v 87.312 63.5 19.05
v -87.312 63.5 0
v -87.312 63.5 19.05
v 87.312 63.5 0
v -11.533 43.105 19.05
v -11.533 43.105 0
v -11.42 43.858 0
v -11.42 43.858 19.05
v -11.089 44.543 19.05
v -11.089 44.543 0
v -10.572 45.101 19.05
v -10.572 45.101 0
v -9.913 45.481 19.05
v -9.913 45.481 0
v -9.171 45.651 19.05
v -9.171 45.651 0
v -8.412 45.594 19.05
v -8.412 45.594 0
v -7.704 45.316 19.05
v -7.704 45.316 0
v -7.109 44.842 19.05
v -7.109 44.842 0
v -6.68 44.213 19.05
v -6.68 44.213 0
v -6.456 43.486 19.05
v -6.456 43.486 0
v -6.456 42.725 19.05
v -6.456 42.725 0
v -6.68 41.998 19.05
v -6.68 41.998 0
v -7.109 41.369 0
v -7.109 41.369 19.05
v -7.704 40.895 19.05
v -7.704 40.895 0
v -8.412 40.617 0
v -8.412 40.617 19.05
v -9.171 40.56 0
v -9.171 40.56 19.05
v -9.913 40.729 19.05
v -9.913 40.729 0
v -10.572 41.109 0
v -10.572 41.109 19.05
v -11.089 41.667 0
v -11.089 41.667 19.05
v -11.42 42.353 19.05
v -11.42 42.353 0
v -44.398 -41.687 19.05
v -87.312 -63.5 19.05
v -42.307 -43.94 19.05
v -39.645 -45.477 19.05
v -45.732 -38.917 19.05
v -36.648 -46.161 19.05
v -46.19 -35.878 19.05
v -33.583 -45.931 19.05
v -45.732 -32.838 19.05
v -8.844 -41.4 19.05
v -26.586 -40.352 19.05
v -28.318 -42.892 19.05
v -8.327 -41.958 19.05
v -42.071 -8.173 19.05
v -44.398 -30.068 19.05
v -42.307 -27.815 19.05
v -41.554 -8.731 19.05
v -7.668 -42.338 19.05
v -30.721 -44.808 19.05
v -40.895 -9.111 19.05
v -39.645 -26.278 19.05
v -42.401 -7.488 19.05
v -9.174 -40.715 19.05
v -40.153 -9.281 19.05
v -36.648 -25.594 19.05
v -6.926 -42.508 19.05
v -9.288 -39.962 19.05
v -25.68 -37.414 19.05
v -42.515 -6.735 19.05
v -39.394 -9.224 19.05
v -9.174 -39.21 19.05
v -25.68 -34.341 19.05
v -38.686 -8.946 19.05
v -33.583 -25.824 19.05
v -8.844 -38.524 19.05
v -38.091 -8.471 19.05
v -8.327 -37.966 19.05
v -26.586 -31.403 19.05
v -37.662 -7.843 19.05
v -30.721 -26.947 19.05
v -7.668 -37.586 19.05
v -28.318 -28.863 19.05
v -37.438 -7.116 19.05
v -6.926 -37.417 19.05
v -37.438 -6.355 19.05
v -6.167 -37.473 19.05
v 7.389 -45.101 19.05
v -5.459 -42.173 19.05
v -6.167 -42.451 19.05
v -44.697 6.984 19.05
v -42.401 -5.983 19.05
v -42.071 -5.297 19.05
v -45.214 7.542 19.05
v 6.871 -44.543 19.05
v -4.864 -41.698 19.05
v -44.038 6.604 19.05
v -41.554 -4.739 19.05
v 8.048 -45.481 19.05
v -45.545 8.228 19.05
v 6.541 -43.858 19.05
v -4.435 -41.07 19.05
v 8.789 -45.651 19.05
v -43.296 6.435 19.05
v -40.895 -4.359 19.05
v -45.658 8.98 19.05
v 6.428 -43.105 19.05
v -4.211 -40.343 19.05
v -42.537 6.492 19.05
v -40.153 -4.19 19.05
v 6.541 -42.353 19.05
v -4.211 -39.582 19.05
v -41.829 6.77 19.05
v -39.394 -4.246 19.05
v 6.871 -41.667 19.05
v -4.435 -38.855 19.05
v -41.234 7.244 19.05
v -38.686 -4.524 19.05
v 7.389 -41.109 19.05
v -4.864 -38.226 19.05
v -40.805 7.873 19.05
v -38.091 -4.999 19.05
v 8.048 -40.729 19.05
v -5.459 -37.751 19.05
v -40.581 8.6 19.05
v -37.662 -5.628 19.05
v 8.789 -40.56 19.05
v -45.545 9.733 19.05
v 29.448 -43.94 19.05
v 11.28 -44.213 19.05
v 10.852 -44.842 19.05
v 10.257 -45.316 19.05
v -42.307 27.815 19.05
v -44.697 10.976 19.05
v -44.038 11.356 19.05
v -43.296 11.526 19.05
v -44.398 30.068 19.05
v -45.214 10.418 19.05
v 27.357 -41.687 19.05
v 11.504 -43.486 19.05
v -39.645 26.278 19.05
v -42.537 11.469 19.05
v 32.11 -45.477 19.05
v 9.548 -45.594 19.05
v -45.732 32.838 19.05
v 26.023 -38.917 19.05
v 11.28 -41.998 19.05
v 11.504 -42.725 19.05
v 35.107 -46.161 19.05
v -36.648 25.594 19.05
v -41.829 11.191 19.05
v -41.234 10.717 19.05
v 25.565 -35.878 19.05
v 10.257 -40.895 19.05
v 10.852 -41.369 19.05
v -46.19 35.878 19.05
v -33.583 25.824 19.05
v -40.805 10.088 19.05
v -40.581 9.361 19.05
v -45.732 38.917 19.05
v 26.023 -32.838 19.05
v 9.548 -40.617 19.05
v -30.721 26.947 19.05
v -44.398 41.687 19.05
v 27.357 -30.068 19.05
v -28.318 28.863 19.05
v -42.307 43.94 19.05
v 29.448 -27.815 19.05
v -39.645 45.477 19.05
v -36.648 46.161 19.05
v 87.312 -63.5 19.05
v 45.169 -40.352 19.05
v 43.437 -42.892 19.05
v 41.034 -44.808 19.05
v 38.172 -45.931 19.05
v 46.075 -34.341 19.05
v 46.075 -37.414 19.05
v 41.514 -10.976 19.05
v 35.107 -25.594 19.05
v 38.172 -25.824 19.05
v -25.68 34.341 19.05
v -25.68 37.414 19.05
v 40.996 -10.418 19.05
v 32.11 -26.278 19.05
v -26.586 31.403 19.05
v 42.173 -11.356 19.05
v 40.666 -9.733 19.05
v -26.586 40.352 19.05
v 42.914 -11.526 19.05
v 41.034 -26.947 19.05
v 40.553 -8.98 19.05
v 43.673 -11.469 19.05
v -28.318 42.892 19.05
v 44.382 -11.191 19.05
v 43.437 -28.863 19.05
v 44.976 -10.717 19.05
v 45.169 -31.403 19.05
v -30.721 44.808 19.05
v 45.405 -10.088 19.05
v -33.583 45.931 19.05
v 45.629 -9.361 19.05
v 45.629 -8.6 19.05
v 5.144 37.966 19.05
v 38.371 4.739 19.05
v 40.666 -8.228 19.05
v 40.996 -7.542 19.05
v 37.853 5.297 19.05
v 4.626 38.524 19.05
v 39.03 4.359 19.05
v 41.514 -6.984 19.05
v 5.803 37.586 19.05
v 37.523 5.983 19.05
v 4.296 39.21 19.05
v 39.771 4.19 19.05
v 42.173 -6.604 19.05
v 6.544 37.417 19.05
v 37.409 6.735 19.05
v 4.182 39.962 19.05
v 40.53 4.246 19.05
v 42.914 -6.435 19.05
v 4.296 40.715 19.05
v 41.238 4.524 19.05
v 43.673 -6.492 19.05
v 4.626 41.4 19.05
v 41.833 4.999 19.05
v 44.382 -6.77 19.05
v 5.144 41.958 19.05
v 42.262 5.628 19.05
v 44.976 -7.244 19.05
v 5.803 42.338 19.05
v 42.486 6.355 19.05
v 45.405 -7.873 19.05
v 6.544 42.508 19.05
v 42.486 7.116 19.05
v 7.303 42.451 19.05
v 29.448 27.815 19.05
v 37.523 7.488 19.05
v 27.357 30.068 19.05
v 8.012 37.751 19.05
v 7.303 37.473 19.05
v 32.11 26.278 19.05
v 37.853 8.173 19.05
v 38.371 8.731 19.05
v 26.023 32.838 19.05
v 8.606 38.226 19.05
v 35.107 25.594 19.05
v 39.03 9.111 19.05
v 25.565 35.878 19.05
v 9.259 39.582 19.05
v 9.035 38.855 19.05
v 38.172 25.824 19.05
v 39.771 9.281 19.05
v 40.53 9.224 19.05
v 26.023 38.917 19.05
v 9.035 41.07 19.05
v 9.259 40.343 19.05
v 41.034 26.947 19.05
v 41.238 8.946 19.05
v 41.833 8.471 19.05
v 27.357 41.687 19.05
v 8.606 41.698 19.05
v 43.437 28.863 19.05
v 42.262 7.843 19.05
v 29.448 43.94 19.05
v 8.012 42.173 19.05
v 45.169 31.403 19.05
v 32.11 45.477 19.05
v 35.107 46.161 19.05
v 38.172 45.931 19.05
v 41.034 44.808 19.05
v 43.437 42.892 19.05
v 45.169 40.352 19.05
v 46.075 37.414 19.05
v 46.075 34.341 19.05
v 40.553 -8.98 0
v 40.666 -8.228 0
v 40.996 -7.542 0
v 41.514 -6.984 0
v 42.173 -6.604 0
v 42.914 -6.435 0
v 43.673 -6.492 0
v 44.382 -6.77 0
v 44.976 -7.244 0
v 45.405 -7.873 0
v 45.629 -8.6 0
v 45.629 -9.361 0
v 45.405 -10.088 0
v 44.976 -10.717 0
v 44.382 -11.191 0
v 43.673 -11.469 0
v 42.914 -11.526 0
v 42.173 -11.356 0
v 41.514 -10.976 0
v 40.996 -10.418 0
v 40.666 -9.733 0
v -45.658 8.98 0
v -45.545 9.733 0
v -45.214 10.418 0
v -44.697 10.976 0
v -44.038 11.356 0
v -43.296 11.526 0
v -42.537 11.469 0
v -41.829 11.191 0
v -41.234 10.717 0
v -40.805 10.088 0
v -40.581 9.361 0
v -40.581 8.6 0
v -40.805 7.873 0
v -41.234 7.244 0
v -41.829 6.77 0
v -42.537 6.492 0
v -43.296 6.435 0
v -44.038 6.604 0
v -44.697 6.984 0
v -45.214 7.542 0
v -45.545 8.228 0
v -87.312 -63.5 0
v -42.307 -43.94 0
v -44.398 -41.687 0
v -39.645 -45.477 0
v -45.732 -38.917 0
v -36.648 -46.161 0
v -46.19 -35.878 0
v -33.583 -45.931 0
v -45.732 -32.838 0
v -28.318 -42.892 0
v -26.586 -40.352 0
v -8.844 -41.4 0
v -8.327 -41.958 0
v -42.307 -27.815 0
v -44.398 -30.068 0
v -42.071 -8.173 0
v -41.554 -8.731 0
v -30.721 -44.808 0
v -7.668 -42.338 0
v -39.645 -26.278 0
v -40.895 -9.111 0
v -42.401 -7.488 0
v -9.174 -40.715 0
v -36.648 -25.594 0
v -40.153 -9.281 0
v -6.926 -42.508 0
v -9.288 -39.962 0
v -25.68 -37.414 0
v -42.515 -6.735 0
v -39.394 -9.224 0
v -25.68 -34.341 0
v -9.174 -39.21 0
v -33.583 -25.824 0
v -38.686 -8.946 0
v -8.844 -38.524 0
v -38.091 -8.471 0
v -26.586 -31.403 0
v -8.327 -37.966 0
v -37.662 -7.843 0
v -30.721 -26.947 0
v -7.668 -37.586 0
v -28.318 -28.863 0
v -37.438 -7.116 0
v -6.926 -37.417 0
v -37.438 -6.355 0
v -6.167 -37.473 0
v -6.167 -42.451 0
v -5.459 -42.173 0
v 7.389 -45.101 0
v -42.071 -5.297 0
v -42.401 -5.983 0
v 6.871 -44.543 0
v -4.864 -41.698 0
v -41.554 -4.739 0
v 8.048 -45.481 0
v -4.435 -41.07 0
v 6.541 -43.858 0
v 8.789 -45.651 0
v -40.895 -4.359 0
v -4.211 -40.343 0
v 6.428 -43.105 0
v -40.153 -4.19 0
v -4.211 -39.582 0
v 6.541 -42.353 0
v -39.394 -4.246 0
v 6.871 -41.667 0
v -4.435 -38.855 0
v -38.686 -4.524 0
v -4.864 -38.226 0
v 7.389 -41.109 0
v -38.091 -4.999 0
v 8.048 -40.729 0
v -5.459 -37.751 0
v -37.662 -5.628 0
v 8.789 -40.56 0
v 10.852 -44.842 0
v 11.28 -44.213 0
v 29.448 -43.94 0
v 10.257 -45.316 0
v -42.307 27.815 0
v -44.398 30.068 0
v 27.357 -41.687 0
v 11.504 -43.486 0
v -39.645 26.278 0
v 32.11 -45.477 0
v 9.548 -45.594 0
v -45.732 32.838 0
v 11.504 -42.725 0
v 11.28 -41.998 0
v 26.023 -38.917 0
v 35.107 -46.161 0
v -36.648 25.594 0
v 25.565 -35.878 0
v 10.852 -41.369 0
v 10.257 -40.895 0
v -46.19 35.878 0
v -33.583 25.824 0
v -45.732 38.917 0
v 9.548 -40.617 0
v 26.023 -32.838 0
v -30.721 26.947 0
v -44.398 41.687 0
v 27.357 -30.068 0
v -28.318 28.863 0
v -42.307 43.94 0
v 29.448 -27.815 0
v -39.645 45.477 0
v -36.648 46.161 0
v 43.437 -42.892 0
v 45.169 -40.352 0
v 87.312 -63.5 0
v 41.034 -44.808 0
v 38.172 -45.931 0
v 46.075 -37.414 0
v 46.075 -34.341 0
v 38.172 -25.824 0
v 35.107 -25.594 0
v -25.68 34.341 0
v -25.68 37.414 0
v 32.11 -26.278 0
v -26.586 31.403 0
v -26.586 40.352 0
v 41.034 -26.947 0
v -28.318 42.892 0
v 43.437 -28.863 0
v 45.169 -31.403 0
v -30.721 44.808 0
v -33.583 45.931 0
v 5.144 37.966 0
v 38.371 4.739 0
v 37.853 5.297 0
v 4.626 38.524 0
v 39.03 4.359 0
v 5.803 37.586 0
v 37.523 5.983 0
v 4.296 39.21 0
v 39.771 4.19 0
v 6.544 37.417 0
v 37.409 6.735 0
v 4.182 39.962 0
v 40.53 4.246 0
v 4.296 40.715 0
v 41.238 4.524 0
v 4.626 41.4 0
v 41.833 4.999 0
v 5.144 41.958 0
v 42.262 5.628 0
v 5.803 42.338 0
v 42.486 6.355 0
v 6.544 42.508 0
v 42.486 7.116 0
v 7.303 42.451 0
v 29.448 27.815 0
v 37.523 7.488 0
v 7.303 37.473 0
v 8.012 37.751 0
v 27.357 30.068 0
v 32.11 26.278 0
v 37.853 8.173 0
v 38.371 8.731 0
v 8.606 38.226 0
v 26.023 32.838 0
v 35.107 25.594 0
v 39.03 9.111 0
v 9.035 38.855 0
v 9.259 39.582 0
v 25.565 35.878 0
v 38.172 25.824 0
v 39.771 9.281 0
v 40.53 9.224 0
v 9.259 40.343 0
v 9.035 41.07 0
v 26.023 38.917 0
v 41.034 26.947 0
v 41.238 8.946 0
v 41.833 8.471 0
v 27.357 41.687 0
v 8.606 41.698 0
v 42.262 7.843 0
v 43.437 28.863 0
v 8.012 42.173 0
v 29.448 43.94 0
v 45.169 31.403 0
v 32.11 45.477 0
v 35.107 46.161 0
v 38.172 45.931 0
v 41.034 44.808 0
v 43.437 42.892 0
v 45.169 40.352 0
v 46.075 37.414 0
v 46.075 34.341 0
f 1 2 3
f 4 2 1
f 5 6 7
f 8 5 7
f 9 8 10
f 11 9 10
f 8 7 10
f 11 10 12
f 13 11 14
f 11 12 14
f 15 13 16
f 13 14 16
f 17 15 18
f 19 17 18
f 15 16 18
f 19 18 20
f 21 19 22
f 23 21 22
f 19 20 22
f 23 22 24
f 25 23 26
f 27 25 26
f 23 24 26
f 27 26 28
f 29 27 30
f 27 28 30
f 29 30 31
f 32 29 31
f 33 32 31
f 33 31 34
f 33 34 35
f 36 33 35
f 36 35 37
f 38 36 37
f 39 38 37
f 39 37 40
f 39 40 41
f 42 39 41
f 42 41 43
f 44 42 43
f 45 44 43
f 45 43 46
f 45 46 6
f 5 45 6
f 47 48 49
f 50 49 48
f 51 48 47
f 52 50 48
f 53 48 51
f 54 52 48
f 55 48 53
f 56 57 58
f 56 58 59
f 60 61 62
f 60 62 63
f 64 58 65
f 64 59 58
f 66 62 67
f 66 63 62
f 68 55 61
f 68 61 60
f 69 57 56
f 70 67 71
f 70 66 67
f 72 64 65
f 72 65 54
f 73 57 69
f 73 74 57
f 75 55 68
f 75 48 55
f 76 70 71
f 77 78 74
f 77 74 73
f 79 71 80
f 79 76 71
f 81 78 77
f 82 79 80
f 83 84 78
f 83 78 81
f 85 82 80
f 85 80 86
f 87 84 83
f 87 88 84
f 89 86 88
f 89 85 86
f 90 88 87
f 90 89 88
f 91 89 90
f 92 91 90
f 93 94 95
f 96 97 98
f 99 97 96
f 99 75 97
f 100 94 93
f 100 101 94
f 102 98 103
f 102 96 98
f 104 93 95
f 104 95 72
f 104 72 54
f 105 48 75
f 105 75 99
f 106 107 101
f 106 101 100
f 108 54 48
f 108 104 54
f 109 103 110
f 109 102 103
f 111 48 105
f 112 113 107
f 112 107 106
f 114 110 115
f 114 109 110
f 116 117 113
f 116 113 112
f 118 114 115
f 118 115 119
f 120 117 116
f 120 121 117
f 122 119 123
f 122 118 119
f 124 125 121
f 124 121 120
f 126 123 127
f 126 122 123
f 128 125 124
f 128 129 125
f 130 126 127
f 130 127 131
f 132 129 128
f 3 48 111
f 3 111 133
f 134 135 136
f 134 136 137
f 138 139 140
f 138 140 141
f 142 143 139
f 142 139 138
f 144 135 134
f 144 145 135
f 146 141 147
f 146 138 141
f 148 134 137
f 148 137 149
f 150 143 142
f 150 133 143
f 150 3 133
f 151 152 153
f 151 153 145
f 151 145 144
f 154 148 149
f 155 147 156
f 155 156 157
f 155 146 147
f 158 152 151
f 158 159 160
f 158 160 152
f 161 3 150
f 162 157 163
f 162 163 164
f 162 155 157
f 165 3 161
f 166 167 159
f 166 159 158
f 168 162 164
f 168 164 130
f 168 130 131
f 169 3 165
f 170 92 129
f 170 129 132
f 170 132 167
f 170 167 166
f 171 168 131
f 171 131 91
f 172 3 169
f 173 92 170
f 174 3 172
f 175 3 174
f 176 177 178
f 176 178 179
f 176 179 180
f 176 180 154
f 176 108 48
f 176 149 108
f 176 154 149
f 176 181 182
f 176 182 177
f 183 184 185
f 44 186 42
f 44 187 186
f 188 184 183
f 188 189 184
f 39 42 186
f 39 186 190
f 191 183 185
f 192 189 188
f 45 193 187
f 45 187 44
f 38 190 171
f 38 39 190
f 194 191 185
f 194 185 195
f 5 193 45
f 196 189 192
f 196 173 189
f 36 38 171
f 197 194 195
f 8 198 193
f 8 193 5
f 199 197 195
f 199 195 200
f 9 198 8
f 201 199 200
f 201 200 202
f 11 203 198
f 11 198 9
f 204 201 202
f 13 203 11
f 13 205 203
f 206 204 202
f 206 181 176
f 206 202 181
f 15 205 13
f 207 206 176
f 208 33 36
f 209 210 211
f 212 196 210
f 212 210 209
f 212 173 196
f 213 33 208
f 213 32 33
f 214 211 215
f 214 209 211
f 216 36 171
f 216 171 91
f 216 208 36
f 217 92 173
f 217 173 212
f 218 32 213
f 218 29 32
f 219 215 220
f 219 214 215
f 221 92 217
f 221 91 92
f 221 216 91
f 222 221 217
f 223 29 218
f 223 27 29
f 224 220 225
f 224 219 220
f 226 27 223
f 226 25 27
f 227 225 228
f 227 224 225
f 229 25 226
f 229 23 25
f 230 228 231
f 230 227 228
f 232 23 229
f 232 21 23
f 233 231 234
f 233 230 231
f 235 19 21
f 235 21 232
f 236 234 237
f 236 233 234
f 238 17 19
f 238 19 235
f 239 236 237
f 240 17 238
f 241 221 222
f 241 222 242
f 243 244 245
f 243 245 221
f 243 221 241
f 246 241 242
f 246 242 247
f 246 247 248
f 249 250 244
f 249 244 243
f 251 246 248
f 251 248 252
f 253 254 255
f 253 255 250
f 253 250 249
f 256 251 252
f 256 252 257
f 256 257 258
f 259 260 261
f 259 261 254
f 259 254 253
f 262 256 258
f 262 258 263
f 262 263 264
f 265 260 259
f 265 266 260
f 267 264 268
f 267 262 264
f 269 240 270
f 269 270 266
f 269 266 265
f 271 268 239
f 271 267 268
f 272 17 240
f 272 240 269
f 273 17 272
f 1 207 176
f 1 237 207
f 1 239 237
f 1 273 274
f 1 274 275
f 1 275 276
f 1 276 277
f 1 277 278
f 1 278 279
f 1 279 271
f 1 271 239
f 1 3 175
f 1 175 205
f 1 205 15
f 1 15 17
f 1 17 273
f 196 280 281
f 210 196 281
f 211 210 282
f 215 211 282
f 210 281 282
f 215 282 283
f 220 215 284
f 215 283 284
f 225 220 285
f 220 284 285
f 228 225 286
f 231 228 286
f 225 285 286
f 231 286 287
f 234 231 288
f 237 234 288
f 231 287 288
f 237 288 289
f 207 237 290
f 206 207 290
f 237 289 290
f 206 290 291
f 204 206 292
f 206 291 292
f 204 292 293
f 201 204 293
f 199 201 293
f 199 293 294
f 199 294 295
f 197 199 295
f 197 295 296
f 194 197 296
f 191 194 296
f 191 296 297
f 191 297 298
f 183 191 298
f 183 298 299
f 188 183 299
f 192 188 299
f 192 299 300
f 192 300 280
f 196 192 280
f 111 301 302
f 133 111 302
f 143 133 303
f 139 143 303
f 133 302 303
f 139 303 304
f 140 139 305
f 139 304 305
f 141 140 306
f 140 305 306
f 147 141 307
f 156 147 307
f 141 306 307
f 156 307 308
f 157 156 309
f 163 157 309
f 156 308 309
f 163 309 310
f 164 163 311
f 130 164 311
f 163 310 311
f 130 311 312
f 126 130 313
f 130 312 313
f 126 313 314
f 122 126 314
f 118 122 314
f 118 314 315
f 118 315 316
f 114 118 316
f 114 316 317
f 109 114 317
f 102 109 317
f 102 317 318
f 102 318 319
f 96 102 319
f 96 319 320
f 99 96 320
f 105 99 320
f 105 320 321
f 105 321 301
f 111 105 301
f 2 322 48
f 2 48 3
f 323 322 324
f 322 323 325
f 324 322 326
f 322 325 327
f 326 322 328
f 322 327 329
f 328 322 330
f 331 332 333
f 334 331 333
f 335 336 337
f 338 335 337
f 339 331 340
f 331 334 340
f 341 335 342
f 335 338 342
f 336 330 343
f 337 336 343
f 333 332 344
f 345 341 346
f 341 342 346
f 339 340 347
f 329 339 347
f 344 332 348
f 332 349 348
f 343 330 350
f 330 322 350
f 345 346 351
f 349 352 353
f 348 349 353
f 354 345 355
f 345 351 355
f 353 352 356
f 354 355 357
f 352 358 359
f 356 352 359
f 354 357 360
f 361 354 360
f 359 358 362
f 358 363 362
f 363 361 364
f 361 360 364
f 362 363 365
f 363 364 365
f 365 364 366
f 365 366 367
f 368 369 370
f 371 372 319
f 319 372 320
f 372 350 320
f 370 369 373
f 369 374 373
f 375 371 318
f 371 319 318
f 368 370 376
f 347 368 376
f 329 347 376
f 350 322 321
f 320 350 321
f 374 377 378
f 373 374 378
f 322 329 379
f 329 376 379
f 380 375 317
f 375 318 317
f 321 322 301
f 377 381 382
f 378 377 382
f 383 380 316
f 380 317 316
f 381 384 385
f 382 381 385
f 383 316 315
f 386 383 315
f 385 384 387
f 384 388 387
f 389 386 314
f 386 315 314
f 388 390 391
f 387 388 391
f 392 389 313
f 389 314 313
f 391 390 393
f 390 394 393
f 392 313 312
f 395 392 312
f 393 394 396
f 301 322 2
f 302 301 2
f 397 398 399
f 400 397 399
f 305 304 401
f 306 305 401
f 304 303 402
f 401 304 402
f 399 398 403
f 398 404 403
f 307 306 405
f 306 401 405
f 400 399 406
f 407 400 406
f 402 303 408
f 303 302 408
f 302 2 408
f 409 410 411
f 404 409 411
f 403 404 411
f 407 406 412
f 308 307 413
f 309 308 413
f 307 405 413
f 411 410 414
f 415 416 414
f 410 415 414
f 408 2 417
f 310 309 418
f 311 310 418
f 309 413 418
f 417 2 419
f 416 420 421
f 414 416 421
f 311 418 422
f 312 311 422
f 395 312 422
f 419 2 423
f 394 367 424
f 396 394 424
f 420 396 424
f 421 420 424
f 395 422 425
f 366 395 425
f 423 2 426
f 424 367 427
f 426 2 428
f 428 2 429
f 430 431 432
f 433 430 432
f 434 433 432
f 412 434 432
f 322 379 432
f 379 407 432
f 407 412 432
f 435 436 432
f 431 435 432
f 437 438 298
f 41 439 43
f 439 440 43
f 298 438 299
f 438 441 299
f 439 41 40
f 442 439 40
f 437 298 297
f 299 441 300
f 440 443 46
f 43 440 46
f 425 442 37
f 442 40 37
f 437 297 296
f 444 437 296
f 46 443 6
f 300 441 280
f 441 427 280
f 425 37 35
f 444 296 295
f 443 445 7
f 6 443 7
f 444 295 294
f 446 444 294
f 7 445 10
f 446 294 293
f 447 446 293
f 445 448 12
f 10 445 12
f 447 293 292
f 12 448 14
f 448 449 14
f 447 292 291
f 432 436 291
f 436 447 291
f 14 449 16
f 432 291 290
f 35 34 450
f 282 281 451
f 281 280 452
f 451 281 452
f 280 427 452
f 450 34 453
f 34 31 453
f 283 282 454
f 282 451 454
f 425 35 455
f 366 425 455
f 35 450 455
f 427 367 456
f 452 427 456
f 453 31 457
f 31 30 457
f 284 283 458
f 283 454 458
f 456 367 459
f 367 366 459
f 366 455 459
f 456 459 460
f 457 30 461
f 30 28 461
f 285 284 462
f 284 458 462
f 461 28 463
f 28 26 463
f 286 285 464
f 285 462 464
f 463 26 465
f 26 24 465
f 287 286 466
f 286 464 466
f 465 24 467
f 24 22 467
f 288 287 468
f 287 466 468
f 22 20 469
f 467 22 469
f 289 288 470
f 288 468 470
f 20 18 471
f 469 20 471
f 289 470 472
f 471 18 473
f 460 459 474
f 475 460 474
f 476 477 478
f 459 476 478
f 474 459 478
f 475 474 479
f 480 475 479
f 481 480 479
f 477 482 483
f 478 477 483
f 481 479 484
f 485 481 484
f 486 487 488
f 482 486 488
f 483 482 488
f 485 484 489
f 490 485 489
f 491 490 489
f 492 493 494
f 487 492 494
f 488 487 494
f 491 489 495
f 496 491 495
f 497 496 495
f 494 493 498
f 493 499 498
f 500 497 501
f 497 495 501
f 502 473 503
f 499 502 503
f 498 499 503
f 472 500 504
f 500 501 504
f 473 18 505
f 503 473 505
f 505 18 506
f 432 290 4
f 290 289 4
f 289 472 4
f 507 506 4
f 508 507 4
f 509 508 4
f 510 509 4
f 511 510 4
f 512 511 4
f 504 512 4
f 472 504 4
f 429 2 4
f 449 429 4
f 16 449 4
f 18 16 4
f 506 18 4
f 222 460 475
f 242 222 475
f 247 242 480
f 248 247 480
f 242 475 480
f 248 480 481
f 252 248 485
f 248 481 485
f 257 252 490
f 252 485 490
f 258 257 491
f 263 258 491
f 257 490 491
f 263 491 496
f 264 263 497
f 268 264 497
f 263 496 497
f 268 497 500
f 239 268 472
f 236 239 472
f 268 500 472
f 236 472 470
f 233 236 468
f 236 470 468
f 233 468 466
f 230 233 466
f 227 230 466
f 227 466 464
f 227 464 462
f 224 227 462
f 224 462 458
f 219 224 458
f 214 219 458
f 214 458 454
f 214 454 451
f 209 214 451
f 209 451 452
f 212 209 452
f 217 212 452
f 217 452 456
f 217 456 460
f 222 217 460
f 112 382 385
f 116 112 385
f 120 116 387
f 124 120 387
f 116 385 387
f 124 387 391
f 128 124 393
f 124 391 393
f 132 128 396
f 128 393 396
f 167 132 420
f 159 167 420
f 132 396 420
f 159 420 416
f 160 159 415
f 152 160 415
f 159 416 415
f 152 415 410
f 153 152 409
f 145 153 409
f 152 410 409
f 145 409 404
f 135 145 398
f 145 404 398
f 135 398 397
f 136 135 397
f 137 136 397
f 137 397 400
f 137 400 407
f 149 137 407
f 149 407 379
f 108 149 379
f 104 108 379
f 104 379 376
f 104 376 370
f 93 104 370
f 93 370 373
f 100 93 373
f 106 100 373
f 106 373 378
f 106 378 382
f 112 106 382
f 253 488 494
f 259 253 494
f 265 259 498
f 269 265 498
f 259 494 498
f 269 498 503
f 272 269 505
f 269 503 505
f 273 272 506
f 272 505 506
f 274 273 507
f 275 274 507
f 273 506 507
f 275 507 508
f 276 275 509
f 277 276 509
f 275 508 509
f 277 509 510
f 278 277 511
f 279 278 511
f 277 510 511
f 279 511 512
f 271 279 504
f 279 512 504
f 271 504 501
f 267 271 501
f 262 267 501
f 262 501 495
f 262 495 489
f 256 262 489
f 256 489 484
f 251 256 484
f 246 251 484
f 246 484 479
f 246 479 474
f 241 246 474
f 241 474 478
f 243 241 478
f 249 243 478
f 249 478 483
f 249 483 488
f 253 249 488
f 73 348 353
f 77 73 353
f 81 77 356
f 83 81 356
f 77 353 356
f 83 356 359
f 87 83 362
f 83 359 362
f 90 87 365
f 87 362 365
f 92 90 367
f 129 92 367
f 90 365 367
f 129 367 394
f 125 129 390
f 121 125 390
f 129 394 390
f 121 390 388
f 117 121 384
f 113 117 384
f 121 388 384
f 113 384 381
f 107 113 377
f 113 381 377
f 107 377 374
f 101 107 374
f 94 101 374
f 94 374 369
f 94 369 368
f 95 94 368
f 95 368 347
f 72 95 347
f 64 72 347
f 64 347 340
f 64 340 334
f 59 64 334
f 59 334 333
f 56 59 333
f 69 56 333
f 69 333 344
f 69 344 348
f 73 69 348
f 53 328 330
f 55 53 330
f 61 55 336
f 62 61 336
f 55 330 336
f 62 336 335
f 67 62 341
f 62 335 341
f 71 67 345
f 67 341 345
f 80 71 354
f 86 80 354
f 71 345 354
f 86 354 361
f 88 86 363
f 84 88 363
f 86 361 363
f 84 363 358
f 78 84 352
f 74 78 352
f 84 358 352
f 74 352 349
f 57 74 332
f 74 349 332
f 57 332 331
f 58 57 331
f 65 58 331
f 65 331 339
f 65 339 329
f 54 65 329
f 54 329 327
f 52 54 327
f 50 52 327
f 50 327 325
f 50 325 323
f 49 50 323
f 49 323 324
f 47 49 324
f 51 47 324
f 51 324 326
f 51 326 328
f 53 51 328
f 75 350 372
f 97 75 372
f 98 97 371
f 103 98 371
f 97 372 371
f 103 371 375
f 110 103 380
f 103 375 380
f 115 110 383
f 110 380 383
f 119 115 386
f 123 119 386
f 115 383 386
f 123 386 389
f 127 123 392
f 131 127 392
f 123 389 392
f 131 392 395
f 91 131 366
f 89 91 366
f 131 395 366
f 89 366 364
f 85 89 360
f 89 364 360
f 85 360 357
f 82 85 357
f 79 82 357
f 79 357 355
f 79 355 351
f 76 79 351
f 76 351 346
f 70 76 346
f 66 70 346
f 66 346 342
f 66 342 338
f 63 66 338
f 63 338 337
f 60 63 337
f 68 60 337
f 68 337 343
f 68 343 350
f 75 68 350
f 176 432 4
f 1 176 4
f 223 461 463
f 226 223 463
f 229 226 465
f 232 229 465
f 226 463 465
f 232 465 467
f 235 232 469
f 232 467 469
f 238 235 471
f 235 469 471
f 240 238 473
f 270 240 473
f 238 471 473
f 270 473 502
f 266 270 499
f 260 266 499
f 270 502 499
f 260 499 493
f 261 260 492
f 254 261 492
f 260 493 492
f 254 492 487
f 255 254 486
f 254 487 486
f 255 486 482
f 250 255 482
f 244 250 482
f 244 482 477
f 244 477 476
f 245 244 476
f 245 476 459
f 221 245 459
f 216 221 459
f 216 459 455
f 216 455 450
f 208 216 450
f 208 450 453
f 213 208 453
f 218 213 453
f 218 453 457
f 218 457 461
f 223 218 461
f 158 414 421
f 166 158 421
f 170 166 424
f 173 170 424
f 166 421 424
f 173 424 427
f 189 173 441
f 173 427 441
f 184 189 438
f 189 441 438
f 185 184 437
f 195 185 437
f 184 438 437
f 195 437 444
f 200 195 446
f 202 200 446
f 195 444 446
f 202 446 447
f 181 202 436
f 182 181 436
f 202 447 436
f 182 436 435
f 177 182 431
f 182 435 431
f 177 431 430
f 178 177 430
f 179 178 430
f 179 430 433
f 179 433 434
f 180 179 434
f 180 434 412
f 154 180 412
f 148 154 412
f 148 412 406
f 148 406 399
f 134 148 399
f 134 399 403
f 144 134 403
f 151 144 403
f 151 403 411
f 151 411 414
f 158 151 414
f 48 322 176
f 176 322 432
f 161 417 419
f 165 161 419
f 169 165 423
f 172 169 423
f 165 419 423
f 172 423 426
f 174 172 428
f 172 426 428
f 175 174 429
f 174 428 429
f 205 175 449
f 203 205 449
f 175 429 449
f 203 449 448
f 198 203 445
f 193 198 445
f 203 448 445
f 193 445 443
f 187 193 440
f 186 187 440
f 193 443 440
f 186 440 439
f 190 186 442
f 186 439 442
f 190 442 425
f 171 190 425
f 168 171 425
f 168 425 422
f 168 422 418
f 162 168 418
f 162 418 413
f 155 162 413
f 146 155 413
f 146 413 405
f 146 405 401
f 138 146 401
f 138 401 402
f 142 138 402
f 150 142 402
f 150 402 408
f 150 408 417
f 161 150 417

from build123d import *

# Parameters (mm, degrees)
F0_W     = 174.625
F0_H     = 127
F1_DEPTH = 19.05
F3_D     = 20.6248
F5_D     = 5.1054


with BuildPart() as f1:
    # F0 (on Top) → F1 (new body)
    with BuildSketch(Plane.XY):
        Rectangle(F0_W, F0_H)
    extrude(amount=F1_DEPTH)

    # F3 (through all)
    with Locations(Plane.XY.offset(19.05)):
        with Locations((-35.8775, 35.8775), (-35.8775, -35.8775), (35.8775, 35.8775), (35.8775, -35.8775)):
            Hole(F3_D / 2)

    # F5 (through all)
    with Locations(Plane.XY.offset(19.05)):
        with Locations((-8.9802561211, 43.1052293811), (6.7351920908, 39.9621397388), (-43.1052293811, 8.9802561211), (-39.9621397388, -6.7351920908), (-6.7351920908, -39.9621397388), (8.9802561211, -43.1052293811), (43.1052293811, -8.9802561211), (39.9621397388, 6.7351920908)):
            Hole(F5_D / 2)


solid = f1.part
